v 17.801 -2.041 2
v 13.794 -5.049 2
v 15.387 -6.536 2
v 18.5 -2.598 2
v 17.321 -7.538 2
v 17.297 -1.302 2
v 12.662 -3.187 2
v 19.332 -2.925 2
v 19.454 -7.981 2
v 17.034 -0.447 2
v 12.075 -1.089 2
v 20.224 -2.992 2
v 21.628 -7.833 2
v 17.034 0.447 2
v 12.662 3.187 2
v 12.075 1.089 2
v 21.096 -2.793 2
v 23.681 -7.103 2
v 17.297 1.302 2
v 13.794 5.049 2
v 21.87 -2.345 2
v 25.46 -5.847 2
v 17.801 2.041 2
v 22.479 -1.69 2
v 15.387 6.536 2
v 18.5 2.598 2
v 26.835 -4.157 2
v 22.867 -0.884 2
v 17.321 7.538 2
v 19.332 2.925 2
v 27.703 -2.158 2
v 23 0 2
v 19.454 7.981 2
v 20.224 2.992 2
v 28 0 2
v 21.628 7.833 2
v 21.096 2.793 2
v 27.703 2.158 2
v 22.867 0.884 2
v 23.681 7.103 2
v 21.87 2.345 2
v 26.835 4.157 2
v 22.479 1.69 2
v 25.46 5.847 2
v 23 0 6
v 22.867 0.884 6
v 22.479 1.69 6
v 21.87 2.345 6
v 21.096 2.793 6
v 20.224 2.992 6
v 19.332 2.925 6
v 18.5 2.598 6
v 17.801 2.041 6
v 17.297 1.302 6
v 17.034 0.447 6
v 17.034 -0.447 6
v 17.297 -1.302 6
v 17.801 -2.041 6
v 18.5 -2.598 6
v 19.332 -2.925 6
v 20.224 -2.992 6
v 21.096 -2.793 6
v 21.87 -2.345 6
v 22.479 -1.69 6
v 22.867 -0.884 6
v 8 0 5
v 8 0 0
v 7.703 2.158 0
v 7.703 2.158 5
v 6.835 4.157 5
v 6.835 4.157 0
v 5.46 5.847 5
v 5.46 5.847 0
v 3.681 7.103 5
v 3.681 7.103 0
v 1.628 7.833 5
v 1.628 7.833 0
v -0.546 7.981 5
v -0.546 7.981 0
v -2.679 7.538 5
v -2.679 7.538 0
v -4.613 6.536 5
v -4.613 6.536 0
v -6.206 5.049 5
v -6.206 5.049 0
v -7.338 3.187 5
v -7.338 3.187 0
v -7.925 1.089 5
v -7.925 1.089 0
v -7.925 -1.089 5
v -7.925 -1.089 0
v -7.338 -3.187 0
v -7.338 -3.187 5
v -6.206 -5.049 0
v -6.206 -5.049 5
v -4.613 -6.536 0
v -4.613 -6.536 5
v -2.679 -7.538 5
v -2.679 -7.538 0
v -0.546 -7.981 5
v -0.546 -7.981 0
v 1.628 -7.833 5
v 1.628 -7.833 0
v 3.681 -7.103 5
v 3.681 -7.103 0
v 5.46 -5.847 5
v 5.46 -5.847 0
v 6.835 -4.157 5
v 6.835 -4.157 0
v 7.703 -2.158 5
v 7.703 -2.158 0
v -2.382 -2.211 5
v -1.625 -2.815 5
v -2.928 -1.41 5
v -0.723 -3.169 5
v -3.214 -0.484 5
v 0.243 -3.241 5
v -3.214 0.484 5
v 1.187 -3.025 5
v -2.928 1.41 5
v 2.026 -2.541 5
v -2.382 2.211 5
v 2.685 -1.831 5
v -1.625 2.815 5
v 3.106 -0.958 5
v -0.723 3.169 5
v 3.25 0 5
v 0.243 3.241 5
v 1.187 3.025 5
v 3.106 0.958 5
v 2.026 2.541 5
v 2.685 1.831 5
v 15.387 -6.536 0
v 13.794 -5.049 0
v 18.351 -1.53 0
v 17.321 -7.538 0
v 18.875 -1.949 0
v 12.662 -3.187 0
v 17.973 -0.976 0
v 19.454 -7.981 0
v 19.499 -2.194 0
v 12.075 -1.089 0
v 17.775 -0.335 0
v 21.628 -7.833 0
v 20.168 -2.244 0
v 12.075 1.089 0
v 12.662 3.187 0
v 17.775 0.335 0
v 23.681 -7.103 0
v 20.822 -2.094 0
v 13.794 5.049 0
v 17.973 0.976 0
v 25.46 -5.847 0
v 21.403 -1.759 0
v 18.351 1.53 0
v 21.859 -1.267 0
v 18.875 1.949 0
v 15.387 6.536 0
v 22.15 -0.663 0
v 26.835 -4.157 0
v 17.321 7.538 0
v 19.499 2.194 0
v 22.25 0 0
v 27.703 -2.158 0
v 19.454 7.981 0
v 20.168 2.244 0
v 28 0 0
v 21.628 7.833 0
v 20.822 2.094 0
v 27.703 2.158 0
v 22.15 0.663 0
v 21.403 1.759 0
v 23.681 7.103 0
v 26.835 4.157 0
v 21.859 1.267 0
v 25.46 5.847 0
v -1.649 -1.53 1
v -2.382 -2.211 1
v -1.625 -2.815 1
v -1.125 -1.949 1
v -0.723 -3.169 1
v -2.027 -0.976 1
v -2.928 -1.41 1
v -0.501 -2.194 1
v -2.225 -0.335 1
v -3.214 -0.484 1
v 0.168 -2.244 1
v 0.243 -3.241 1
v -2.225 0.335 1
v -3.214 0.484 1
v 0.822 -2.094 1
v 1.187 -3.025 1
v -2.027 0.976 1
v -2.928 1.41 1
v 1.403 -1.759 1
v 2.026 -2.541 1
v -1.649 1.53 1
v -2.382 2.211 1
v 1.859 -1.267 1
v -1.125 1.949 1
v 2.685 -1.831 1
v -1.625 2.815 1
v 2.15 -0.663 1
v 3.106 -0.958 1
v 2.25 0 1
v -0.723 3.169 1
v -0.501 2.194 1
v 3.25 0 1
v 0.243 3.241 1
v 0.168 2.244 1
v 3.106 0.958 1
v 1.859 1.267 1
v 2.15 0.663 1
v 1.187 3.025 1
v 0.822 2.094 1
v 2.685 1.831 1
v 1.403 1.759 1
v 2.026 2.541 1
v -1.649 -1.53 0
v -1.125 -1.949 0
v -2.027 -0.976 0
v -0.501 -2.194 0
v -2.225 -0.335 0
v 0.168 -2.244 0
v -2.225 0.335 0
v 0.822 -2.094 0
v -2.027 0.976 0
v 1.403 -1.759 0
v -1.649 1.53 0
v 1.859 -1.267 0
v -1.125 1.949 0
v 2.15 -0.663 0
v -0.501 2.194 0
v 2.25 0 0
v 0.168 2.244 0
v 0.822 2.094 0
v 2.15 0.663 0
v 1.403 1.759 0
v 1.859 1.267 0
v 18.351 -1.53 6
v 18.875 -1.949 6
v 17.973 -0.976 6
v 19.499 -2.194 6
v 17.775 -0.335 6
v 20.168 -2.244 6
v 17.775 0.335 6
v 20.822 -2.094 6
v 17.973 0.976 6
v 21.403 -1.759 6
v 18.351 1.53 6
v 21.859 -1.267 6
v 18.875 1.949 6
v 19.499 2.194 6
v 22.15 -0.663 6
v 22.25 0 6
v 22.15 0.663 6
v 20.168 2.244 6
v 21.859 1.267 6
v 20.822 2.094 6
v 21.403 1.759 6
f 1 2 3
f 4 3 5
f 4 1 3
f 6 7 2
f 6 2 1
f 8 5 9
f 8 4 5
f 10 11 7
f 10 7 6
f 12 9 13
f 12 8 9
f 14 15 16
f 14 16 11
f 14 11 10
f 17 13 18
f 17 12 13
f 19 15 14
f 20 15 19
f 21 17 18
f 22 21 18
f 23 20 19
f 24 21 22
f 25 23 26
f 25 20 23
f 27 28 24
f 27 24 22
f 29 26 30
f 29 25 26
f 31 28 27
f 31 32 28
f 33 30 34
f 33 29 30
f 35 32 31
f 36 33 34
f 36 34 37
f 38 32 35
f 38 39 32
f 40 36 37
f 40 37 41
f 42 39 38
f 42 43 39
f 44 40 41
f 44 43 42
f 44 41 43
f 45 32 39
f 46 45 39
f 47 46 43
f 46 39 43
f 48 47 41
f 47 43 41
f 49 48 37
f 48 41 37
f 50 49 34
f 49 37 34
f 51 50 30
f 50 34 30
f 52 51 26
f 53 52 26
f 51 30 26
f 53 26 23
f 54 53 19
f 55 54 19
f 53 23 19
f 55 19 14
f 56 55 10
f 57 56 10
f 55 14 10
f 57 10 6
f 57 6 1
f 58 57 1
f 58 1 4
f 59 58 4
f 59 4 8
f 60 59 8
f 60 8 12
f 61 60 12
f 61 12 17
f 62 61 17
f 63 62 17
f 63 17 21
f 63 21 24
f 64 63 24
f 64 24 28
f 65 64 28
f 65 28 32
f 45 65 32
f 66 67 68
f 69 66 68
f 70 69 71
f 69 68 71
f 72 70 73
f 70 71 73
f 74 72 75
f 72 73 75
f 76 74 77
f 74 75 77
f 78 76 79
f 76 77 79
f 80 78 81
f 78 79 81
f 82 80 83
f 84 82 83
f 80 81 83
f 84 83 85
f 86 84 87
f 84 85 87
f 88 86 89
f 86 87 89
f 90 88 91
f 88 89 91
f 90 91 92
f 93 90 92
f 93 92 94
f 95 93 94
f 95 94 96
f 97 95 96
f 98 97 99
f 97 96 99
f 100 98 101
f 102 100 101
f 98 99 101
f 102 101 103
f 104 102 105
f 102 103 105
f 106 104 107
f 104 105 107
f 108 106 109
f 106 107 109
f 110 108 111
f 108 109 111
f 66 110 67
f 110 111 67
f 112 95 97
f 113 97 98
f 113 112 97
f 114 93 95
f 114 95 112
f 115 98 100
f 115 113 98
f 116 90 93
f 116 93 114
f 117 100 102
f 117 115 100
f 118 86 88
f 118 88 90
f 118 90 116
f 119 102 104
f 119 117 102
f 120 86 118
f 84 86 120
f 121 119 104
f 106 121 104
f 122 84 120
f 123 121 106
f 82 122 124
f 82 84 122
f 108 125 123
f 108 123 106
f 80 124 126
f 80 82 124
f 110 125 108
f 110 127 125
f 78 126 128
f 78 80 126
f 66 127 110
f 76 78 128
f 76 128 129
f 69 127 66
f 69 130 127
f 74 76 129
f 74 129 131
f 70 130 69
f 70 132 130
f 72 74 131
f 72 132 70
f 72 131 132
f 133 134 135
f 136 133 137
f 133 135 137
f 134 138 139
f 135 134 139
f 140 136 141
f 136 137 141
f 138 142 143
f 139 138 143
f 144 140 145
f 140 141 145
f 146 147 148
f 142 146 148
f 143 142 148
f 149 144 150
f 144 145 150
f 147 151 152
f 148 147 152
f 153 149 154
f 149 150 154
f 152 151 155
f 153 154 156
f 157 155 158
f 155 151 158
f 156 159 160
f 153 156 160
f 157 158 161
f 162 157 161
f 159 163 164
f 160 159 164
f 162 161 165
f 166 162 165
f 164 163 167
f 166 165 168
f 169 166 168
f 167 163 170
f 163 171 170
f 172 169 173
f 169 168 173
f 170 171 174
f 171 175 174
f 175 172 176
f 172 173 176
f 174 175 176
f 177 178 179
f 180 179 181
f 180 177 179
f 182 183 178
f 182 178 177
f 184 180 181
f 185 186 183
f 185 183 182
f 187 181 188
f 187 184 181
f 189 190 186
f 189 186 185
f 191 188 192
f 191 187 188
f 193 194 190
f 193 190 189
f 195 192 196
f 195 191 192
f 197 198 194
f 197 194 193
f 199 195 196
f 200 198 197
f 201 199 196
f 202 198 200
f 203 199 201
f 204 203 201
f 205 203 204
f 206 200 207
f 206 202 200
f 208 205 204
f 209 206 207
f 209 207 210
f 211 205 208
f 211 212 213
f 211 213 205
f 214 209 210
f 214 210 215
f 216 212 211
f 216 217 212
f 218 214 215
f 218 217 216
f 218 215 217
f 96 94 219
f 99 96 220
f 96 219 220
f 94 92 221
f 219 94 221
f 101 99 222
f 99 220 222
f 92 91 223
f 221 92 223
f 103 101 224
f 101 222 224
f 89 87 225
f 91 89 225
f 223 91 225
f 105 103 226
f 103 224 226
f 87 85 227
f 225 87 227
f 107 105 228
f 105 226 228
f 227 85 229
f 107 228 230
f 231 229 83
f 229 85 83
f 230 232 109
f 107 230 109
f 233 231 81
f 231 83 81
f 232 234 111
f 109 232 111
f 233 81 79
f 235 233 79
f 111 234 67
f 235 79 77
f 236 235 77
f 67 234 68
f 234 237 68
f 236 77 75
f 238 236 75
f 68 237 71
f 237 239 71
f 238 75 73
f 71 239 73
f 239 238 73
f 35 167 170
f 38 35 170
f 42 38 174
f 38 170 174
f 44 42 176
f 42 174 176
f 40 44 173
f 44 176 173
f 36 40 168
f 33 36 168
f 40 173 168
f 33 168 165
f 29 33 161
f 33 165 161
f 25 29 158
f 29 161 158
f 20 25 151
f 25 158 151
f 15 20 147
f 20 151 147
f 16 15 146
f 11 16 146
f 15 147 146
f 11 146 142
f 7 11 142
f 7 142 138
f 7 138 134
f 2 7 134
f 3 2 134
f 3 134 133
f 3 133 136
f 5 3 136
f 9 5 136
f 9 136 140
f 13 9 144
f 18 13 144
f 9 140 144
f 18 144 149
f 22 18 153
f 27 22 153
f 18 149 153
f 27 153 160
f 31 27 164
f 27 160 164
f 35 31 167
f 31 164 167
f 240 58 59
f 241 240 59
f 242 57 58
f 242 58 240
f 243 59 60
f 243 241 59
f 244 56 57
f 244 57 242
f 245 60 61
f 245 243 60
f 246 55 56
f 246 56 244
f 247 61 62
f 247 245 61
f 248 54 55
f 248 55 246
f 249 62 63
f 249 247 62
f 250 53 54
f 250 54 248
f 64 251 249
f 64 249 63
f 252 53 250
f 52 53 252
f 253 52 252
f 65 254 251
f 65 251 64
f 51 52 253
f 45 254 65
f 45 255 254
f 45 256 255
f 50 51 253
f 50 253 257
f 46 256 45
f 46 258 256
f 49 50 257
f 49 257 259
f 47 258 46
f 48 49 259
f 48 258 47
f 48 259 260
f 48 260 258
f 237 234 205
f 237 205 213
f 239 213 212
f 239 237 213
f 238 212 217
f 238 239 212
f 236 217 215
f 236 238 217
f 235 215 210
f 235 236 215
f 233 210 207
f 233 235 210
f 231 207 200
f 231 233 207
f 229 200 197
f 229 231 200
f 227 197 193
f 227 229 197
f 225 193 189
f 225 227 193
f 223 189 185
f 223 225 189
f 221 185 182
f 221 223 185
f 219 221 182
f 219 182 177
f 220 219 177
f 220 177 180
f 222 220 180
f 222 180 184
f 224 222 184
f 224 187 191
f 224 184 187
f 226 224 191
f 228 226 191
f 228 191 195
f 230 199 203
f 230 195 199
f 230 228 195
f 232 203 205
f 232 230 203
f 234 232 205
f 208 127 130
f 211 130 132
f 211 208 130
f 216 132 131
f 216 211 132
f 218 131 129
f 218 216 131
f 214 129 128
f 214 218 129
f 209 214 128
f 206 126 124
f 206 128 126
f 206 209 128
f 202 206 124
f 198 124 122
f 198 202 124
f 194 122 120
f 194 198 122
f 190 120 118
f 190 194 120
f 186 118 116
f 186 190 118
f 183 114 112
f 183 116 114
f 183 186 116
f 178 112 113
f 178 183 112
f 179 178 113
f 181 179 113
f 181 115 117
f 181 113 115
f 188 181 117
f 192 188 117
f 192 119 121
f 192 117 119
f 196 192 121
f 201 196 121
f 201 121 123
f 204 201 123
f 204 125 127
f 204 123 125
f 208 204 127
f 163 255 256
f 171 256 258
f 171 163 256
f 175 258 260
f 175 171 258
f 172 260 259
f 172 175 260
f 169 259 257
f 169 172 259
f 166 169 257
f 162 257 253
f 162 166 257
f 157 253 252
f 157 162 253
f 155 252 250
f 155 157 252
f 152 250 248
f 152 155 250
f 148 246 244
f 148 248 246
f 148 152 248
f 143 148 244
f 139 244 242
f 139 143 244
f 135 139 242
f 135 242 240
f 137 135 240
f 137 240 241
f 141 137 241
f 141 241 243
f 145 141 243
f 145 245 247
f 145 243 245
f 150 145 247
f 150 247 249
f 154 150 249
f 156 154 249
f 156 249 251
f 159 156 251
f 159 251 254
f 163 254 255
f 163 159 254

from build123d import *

# Parameters (mm, degrees)
CYLINDER002_R     = 3.25
CYLINDER002_DEPTH = 5
CYLINDER001_R     = 2.25
CYLINDER001_DEPTH = 9
CYLINDER_R        = 8
CYLINDER_DEPTH    = 5
CYLINDER004_R     = 2.25
CYLINDER004_DEPTH = 10
CYLINDER005_R     = 8
CYLINDER005_DEPTH = 2
CYLINDER003_R     = 3
CYLINDER003_DEPTH = 6


with BuildPart() as cylinder002:
    # Cylinder002 → Cylinder002 (new body)
    with BuildSketch(Plane.XY.offset(1)):
        Circle(CYLINDER002_R)
    extrude(amount=CYLINDER002_DEPTH)


with BuildPart() as fusion:
    # Cylinder001 → Cylinder001 (new body)
    with BuildSketch(Plane.XY.offset(-0.5)):
        Circle(CYLINDER001_R)
    extrude(amount=CYLINDER001_DEPTH)

    # Fusion: union Cylinder002
    add(cylinder002.part)


with BuildPart() as body:
    # Cylinder → Cylinder (new body)
    with BuildSketch(Plane.XY):
        Circle(CYLINDER_R)
    extrude(amount=CYLINDER_DEPTH)

    # Cut: cut Fusion
    add(fusion.part, mode=Mode.SUBTRACT)


with BuildPart() as cylinder004:
    # Cylinder004 → Cylinder004 (new body)
    with BuildSketch(Plane(origin=(20, 0, 0), x_dir=(1, 0, 0), z_dir=(0, 0, 1))):
        Circle(CYLINDER004_R)
    extrude(amount=CYLINDER004_DEPTH)


with BuildPart() as cylinder005:
    # Cylinder005 → Cylinder005 (new body)
    with BuildSketch(Plane(origin=(20, 0, 0), x_dir=(1, 0, 0), z_dir=(0, 0, 1))):
        Circle(CYLINDER005_R)
    extrude(amount=CYLINDER005_DEPTH)


with BuildPart() as cap:
    # Cylinder003 → Cylinder003 (new body)
    with BuildSketch(Plane(origin=(20, 0, 0), x_dir=(1, 0, 0), z_dir=(0, 0, 1))):
        Circle(CYLINDER003_R)
    extrude(amount=CYLINDER003_DEPTH)

    # Fusion001: union Cylinder005
    add(cylinder005.part)

    # Cut001: cut Cylinder004
    add(cylinder004.part, mode=Mode.SUBTRACT)


solid = Compound([body.part, cap.part])
